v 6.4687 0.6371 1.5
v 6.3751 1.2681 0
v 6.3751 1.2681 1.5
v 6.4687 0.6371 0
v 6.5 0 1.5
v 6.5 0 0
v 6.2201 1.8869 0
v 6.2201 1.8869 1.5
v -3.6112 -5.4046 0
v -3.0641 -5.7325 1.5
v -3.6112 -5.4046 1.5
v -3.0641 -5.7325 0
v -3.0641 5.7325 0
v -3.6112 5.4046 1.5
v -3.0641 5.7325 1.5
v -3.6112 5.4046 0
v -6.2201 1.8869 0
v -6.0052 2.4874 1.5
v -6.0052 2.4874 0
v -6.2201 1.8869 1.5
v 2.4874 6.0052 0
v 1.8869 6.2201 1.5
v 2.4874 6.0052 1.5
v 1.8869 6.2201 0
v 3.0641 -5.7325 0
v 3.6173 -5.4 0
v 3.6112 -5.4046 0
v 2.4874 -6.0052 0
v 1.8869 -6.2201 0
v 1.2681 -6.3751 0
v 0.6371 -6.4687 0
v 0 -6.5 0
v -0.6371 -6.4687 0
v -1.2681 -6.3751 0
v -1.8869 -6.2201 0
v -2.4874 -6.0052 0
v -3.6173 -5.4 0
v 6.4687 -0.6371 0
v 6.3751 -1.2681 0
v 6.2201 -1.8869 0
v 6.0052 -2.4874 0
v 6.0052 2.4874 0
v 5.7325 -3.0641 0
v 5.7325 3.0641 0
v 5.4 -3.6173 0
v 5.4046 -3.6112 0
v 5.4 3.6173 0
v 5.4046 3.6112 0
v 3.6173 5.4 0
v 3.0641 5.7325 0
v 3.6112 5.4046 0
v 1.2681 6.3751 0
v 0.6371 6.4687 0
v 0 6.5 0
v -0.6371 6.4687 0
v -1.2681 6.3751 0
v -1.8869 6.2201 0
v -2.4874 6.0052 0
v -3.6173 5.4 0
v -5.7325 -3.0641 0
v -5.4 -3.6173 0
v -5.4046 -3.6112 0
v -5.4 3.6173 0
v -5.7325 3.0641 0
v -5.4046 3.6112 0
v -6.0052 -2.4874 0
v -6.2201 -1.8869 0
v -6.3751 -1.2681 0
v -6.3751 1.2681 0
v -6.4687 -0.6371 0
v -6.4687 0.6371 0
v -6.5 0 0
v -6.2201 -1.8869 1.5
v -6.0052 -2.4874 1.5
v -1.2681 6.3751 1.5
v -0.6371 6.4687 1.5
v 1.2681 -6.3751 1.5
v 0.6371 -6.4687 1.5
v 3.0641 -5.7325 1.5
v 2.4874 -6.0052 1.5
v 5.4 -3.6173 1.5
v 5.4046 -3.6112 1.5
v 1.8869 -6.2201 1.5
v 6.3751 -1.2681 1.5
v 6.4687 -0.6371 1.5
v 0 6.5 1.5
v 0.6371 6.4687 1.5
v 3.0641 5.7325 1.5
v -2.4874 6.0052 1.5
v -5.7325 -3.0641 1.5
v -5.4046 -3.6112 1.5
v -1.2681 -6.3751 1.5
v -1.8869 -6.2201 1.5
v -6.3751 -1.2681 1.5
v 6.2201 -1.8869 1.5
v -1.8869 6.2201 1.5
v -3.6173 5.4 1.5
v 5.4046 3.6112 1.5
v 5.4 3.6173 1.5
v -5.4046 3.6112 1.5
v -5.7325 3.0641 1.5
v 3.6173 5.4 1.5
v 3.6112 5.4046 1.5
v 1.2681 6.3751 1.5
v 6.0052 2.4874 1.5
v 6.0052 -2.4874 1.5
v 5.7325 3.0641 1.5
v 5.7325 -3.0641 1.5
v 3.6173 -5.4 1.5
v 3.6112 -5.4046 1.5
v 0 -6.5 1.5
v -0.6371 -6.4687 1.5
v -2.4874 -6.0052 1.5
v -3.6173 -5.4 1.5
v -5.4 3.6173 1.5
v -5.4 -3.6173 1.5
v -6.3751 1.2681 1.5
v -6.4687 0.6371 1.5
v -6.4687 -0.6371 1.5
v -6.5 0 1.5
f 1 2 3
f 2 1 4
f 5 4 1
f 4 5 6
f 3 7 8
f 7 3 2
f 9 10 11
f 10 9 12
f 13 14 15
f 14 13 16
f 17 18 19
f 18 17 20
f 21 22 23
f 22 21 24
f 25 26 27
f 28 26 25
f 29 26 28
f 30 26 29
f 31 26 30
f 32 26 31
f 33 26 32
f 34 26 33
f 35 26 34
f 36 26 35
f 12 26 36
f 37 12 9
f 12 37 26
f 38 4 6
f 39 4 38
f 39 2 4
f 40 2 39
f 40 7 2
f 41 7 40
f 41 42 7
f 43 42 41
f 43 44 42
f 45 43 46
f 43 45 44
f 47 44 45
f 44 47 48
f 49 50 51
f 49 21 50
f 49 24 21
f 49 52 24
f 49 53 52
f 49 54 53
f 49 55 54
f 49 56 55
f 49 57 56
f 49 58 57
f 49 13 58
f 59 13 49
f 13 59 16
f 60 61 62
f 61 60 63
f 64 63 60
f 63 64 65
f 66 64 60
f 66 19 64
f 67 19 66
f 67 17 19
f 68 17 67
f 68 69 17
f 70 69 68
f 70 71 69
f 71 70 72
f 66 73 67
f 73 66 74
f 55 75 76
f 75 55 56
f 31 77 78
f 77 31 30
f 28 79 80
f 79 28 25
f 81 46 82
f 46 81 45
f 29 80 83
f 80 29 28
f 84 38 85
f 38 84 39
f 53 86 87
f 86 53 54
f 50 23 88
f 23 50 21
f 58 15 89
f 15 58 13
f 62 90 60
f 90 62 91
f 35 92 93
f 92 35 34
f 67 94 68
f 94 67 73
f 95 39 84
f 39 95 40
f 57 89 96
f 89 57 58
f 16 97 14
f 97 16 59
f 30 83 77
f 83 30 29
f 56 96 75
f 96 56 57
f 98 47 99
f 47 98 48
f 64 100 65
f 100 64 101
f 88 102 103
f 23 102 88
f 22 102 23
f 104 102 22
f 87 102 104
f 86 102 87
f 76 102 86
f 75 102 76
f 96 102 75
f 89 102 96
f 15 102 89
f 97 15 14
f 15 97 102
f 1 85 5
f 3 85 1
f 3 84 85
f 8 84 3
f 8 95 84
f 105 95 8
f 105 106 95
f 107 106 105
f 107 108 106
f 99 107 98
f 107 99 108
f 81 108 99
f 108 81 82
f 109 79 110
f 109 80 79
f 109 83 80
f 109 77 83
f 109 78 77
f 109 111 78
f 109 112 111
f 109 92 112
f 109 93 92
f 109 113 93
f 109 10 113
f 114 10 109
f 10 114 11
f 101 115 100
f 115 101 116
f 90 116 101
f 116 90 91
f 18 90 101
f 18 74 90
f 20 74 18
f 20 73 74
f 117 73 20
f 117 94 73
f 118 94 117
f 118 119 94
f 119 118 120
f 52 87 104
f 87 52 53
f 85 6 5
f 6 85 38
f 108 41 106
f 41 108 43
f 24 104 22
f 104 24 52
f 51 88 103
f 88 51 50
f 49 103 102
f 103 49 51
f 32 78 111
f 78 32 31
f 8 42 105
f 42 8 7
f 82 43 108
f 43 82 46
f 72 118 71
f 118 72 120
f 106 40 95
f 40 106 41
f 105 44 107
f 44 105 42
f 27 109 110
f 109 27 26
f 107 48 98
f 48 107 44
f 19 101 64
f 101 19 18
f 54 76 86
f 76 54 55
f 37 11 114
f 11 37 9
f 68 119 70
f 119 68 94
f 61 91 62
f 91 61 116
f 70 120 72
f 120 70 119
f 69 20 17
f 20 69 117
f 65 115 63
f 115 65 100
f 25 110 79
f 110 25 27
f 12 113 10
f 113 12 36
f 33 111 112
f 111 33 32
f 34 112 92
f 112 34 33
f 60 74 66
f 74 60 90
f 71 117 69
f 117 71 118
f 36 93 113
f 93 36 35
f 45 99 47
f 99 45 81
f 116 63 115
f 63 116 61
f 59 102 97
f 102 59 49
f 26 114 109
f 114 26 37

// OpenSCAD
// Adapter sleeve for 0.2 mL PCR tube in a 1.5 mL rack hole
// Designed to fit 0.2 mL tube into a 1.5 mL rack hole
// Print orientation: collar on z=0 to z=1.5, body from z=1.5 to z=21.5
// Features:
// - Collar: 13 mm diameter, 1.5 mm thick, at z=0 to z=1.5
// - Sleeve body: 10.8 mm outer diameter, from z=1.5 to z=21.5
// - Full 6.2 mm bore through entire height, open at both ends

$fn = 64;

// Dimensions in millimeters
collar_diameter = 13.0;
collar_thickness = 1.5;
sleeve_outer_diameter = 10.8;
sleeve_height = 21.5;  // from z=1.5 to z=21.5, so total height is 20.0 mm
bore_diameter = 6.2;
bore_radius = bore_diameter / 2;

// Create the full adapter as a single solid
difference() {
    // Base: collar (13 mm diameter, 1.5 mm thick)
    translate([0, 0, 0])
        cylinder(r = collar_diameter / 2, h = collar_thickness, $fn = 64);

    // Sleeve body: 10.8 mm outer diameter, from z=1.5 to z=21.5 (height = 20.0 mm)
    translate([0, 0, collar_thickness])
        cube([sleeve_outer_diameter, sleeve_outer_diameter, sleeve_height], center = true);

    // Central bore: 6.2 mm diameter, full height (from z=0 to z=23.0)
    translate([0, 0, 0])
        cylinder(r = bore_radius, h = collar_thickness + sleeve_height, $fn = 64);
}
